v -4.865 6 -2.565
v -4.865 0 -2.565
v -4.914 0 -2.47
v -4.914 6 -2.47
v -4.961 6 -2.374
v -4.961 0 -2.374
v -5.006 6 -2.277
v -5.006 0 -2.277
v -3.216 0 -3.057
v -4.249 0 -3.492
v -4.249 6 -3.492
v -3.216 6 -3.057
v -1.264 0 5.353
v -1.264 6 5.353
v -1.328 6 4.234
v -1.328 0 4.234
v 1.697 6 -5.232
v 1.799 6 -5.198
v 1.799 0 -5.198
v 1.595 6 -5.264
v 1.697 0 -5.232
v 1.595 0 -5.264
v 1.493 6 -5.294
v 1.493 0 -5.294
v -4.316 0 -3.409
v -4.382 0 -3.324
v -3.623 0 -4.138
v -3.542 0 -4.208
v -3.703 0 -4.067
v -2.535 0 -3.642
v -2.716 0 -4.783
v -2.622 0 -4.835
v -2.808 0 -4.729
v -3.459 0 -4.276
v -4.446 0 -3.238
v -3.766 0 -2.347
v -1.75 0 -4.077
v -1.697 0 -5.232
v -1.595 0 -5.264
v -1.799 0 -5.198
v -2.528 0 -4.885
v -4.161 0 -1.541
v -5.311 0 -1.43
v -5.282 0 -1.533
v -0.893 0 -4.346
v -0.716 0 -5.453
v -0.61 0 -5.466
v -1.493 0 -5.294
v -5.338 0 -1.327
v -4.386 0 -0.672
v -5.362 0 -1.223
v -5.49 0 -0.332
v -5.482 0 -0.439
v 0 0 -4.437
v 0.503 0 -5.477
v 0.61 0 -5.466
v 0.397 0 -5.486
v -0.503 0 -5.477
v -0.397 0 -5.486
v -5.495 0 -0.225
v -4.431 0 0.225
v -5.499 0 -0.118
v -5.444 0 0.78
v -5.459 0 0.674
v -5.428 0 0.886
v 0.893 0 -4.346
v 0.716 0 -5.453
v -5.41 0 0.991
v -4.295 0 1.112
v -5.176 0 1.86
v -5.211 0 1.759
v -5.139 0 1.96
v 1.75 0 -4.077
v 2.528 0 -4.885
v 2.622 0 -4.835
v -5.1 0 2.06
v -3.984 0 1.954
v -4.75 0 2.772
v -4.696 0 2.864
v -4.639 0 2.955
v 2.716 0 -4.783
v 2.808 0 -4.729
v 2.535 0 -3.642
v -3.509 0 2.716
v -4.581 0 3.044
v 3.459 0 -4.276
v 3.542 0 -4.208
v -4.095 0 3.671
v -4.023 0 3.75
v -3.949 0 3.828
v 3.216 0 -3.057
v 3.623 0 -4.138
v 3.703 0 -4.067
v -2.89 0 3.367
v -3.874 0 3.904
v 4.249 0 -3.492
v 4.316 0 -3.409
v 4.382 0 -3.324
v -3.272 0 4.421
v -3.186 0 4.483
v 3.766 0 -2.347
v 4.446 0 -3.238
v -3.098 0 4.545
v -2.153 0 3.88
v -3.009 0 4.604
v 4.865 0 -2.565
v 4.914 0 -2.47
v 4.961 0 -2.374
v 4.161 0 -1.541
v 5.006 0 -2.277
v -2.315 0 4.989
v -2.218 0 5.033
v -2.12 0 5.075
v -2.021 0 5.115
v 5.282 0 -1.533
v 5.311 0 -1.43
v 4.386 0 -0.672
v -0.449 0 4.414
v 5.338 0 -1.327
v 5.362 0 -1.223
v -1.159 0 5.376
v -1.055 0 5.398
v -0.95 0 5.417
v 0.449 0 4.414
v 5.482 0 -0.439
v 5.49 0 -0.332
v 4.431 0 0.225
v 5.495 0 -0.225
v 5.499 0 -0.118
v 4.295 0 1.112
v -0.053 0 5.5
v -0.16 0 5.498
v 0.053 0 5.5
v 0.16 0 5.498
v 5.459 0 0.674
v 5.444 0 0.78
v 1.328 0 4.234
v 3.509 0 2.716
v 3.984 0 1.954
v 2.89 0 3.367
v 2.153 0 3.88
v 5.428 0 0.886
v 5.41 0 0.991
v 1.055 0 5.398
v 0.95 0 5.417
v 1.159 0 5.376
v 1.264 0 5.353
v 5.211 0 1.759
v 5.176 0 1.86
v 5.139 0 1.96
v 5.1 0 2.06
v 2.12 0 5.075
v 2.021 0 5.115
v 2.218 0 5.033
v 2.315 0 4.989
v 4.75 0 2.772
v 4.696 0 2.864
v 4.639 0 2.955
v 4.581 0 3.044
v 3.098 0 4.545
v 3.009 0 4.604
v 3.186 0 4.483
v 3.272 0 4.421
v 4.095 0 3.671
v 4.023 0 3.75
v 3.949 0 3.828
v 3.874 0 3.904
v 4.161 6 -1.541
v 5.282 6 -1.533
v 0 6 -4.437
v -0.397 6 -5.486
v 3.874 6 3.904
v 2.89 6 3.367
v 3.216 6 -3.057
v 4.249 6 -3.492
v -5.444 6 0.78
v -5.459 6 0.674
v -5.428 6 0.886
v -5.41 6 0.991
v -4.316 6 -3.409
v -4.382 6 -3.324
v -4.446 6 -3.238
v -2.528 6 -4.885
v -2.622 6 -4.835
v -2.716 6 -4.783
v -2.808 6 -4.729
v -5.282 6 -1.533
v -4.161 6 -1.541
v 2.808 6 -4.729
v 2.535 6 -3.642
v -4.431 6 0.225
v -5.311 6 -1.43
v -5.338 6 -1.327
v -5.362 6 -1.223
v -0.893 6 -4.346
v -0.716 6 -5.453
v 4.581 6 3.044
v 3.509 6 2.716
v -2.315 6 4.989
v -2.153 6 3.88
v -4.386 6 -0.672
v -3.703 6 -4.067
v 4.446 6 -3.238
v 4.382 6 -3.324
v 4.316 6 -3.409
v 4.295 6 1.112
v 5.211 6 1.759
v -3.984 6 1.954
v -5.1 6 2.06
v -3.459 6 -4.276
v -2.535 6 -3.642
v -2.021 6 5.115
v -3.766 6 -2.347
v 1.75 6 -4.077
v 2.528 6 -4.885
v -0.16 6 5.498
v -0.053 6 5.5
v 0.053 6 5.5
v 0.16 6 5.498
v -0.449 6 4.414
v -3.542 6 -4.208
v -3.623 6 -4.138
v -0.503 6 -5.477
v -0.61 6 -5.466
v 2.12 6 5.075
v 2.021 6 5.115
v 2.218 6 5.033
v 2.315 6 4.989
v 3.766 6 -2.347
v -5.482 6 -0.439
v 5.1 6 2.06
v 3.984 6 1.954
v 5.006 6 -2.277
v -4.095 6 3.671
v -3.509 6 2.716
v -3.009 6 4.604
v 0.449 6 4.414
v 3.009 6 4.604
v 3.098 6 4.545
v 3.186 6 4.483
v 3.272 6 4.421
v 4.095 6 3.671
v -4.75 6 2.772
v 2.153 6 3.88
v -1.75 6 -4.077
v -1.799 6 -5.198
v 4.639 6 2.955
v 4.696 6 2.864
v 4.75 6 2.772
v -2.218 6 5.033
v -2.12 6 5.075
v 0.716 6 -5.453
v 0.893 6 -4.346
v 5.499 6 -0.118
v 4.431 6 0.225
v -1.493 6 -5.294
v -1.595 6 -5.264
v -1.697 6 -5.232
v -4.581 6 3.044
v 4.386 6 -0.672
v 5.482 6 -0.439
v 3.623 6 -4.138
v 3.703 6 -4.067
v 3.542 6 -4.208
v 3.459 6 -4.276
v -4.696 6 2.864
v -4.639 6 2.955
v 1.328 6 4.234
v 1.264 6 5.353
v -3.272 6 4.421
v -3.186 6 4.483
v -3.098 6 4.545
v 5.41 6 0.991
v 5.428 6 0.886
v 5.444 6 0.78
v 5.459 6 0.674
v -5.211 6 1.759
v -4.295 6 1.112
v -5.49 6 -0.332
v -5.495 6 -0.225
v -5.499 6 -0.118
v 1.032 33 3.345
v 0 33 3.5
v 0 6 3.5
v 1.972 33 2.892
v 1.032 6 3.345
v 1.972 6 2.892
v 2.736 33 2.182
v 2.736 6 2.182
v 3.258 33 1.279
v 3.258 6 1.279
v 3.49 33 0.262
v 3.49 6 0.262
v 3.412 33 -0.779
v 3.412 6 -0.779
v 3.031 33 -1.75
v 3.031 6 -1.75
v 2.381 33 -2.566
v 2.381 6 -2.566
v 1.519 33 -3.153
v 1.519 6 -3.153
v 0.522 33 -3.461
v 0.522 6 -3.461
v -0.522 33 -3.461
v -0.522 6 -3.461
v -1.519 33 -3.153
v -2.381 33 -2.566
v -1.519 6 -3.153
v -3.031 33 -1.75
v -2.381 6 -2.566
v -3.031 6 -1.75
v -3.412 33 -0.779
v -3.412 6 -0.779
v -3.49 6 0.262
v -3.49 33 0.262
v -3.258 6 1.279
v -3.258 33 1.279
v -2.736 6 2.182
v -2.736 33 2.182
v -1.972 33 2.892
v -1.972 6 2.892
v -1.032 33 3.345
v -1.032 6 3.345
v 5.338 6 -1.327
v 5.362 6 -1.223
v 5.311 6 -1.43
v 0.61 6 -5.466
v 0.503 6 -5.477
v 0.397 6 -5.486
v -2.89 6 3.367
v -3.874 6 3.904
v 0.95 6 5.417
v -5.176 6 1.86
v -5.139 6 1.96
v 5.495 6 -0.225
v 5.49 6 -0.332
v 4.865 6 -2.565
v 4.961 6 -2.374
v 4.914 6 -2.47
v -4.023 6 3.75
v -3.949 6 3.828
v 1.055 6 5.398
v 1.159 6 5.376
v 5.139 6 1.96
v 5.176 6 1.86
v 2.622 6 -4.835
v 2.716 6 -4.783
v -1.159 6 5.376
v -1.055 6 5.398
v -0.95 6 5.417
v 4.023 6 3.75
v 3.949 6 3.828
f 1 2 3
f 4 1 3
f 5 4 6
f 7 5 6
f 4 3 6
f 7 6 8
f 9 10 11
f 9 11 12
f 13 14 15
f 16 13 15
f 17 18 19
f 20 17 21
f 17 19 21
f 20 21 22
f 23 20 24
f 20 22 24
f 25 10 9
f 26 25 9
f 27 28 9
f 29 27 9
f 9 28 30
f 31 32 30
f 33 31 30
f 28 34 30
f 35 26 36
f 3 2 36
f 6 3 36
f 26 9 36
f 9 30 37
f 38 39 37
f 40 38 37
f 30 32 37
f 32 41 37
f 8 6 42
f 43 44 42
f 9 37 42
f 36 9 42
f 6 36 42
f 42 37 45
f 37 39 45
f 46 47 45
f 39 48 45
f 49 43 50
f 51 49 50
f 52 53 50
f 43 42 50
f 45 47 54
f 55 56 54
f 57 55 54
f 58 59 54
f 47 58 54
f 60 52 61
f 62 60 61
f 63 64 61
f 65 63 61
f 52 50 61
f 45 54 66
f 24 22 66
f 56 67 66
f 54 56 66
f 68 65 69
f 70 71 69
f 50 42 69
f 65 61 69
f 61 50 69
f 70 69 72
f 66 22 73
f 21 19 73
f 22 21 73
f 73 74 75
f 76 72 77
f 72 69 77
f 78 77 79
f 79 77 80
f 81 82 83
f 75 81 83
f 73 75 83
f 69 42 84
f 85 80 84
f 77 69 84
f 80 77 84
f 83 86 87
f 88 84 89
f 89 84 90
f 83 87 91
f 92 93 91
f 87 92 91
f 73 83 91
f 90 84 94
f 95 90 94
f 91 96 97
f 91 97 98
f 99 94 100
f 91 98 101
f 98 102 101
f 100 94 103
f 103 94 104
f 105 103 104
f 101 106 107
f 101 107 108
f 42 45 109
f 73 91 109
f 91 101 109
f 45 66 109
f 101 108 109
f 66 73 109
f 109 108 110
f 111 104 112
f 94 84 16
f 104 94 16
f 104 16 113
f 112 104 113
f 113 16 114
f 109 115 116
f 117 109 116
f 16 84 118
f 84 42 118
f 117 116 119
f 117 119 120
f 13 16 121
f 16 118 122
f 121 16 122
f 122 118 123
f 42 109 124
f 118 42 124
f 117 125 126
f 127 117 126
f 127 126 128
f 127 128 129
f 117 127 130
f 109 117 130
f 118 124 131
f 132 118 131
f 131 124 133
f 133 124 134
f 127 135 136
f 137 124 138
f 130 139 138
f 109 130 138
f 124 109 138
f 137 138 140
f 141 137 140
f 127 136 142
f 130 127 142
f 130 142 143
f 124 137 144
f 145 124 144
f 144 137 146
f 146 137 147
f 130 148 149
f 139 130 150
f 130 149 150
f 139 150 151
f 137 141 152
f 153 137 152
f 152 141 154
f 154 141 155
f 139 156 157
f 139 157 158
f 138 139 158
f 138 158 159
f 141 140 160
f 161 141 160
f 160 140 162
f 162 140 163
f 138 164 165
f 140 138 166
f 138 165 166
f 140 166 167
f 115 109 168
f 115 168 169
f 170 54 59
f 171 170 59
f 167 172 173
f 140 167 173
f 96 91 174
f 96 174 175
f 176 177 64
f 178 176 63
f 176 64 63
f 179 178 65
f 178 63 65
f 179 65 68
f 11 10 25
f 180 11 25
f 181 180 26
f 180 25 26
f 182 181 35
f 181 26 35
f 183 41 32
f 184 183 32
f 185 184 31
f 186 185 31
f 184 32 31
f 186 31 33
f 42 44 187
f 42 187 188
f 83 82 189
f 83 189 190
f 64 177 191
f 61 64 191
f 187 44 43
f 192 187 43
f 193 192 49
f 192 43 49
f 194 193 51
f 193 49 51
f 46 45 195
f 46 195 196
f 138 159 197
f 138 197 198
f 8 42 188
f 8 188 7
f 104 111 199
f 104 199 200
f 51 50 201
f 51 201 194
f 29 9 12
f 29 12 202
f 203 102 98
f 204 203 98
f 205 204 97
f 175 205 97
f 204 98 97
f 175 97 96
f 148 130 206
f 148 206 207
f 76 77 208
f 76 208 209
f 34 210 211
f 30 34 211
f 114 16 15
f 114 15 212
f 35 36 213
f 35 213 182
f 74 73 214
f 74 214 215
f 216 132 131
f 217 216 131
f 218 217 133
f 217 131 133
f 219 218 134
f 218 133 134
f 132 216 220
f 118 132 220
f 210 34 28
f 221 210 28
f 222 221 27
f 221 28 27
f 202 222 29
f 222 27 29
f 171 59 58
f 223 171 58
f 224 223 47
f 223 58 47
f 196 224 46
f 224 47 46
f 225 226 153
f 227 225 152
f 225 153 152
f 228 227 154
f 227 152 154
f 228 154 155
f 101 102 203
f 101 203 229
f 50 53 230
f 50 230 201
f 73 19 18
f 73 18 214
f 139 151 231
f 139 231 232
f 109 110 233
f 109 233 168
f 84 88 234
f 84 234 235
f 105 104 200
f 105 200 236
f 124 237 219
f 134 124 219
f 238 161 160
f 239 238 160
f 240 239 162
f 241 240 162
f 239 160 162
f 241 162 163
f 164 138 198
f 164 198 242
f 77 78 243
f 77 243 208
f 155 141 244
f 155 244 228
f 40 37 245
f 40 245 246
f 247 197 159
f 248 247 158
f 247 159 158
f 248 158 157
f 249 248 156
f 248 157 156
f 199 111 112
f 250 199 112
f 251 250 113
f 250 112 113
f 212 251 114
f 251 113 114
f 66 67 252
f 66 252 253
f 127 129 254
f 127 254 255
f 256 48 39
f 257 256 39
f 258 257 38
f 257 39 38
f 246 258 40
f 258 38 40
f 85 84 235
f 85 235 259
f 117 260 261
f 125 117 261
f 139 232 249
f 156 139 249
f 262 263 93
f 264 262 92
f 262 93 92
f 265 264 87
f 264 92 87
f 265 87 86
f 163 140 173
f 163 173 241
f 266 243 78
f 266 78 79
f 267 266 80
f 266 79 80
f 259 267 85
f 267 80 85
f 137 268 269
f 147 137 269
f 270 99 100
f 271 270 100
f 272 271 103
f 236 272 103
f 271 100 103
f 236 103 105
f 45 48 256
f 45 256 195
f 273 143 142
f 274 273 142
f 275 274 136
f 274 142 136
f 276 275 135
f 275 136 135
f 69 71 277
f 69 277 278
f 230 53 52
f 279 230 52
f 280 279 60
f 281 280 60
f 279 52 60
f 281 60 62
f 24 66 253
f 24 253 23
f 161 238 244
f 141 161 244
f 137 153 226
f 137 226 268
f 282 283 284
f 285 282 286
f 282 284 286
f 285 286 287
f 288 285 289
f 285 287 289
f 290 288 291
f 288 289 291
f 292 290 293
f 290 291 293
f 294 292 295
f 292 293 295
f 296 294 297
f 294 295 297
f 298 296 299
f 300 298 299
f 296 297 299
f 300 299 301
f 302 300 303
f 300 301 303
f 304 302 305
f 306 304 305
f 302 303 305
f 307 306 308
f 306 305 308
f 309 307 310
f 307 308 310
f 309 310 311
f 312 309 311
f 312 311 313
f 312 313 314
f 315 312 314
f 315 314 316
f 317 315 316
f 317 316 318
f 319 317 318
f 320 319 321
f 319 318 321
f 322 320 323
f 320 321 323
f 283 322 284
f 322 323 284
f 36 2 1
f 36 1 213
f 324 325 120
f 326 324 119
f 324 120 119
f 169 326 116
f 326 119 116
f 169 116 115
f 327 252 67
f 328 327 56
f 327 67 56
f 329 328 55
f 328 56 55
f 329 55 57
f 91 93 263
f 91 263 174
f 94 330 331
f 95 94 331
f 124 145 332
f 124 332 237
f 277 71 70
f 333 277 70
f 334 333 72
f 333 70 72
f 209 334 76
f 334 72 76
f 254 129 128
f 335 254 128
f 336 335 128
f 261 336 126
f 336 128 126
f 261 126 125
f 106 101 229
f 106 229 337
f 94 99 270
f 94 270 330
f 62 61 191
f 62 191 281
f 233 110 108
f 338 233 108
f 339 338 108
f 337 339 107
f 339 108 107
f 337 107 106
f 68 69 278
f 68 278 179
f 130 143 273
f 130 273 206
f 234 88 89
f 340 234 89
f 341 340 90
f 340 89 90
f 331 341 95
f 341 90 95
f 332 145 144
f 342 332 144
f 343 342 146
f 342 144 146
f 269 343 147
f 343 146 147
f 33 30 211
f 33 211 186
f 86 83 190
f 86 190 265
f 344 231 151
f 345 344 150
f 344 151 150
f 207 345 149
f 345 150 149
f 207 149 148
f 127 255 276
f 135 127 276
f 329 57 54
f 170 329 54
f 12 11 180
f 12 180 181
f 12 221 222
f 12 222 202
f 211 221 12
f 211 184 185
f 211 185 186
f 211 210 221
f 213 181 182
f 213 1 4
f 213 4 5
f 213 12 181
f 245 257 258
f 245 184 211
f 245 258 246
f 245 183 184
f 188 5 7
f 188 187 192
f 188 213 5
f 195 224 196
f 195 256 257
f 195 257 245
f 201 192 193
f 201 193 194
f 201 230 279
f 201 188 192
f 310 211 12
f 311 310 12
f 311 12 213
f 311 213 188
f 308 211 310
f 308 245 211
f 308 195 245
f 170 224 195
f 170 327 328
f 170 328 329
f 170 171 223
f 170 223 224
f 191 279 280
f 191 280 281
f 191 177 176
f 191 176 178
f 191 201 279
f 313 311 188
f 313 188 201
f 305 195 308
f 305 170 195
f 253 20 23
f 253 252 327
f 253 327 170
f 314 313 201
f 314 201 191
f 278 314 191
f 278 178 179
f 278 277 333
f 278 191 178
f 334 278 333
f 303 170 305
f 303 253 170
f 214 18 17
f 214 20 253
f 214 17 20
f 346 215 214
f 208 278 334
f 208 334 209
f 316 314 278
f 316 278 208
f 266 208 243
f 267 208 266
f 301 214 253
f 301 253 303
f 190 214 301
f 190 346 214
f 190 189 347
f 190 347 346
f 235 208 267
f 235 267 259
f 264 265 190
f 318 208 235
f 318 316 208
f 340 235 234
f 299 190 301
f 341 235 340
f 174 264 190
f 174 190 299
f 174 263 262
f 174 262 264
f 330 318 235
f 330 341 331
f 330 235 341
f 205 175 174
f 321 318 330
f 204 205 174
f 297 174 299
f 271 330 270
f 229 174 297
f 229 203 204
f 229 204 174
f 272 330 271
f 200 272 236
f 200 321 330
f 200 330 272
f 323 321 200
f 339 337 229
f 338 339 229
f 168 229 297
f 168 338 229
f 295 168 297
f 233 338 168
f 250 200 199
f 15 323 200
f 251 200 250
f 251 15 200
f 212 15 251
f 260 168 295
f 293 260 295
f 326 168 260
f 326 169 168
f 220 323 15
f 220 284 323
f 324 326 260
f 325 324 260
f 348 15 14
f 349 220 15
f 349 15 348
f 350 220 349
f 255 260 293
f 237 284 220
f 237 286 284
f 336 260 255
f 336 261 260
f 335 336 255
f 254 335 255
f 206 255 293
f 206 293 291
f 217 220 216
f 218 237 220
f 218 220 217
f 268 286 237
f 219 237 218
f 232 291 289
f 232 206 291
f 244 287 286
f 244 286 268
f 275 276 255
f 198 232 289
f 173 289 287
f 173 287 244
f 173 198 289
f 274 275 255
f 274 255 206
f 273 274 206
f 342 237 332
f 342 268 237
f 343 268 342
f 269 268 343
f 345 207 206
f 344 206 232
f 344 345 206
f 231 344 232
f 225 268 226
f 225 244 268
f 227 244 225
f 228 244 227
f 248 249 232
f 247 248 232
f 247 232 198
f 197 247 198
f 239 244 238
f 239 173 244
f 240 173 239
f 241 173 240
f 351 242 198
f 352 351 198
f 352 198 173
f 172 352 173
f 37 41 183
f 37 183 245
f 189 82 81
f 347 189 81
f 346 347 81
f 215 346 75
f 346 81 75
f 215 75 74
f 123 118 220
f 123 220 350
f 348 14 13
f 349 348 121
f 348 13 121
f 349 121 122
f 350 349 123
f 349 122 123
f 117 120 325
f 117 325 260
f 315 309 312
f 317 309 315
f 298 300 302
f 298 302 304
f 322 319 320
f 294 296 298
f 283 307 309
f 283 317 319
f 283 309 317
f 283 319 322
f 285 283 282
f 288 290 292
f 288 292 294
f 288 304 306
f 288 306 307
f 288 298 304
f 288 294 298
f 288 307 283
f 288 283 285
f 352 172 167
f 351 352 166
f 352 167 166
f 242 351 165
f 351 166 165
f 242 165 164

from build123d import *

# Parameters (mm, degrees)
SKETCH_1_R          = 5.5
EXTRUDE_1_DEPTH     = 6
CUT_EXTRUDE_4_DEPTH = 10.823441352
SKETCH_3_R          = 3.5
EXTRUDE_5_DEPTH     = 27


with BuildPart() as part:
    # Эскиз1 → Вытянуть1 (new body)
    with BuildSketch(Plane(origin=(0, 0, 0), x_dir=(1, 0, 0), z_dir=(0, 1, 0))):
        with Locations(Location((0, 0, 0), (0, 0, 270))):
            Circle(SKETCH_1_R)
    extrude(amount=EXTRUDE_1_DEPTH)

    # Эскиз2 → Вытянуть4 (cut, through all)
    with BuildSketch(Plane(origin=(0, 0, 0), x_dir=(1, 0, 0), z_dir=(0, 1, 0))):
        Polygon((-0.5, 5.758821463), (0.5, 5.758821463), (0, 4.437090717), align=None)
        Polygon((0.669477267, 5.741587309), (0.893179795, 4.346263209), (1.649007209, 5.540288789), align=None)
        Polygon((1.811546057, 5.489291897), (1.749792704, 4.077499175), (2.730503868, 5.094936042), align=None)
        Polygon((2.879449938, 5.012264229), (2.534768894, 3.641801846), (3.700213379, 4.440996014), align=None)
        Polygon((3.8294688, 4.330033874), (3.215971348, 3.057008721), (4.518435719, 3.605241087), align=None)
        Polygon((4.622708759, 3.470531425), (3.765511557, 2.3470613), (5.15167277, 2.621887167), align=None)
        Polygon((5.226694479, 2.46894501), (4.16089128, 1.541024913), (5.573999732, 1.531192878), align=None)
        Polygon((5.616698713, 1.366279697), (4.385923626, 0.671898786), (5.76812649, 0.377811373), align=None)
        Polygon((5.776754641, 0.207678733), (4.431395743, -0.224734957), (5.726105473, -0.791037774), align=None)
        Polygon((5.700309556, -0.959424623), (4.295445997, -1.112168024), (5.449657024, -1.927501742), align=None)
        Polygon((5.390493128, -2.087249022), (3.983640188, -1.954068802), (4.950098976, -2.985053562), align=None)
        Polygon((4.859989278, -3.129621201), (3.508743681, -2.715969773), (4.247883295, -3.920396938), align=None)
        Polygon((4.130516895, -4.043866321), (2.890198796, -3.366678623), (3.371758773, -4.695238804), align=None)
        Polygon((3.231940666, -4.792555078), (2.153328833, -3.879555254), (2.35759405, -5.27785704), align=None)
        Polygon((2.201048406, -5.345036067), (1.328301334, -4.233602437), (1.24690915, -5.64439919), align=None)
        Polygon((1.080044966, -5.678690651), (0.448893022, -4.414325439), (0.085175642, -5.779858973), align=None)
        Polygon((-0.085175642, -5.779858973), (-0.448893022, -4.414325439), (-1.080044966, -5.678690651), align=None)
        Polygon((-1.24690915, -5.64439919), (-1.328301334, -4.233602437), (-2.201048406, -5.345036067), align=None)
        Polygon((-2.35759405, -5.27785704), (-2.153328833, -3.879555254), (-3.231940666, -4.792555078), align=None)
        Polygon((-3.371758773, -4.695238804), (-2.890198796, -3.366678623), (-4.130516895, -4.043866321), align=None)
        Polygon((-4.247883295, -3.920396938), (-3.508743681, -2.715969773), (-4.859989278, -3.129621201), align=None)
        Polygon((-4.950098976, -2.985053562), (-3.983640188, -1.954068802), (-5.390493128, -2.087249022), align=None)
        Polygon((-5.449657024, -1.927501742), (-4.295445997, -1.112168024), (-5.700309556, -0.959424623), align=None)
        Polygon((-5.726105473, -0.791037774), (-4.431395743, -0.224734957), (-5.776754641, 0.207678733), align=None)
        Polygon((-5.76812649, 0.377811373), (-4.385923626, 0.671898786), (-5.616698713, 1.366279697), align=None)
        Polygon((-5.573999732, 1.531192878), (-4.16089128, 1.541024913), (-5.226694479, 2.46894501), align=None)
        Polygon((-5.15167277, 2.621887167), (-3.765511557, 2.3470613), (-4.622708759, 3.470531425), align=None)
        Polygon((-4.518435719, 3.605241087), (-3.215971348, 3.057008721), (-3.8294688, 4.330033874), align=None)
        Polygon((-3.700213379, 4.440996014), (-2.534768894, 3.641801846), (-2.879449938, 5.012264229), align=None)
        Polygon((-2.730503868, 5.094936042), (-1.749792704, 4.077499175), (-1.811546057, 5.489291897), align=None)
        Polygon((-1.649007209, 5.540288789), (-0.893179795, 4.346263209), (-0.669477267, 5.741587309), align=None)
    extrude(amount=CUT_EXTRUDE_4_DEPTH, mode=Mode.SUBTRACT)

    # Эскиз3 → Вытянуть5 (add)
    with BuildSketch(Plane(origin=(0, 6, 0), x_dir=(-1, 0, 0), z_dir=(0, 1, 0))):
        with Locations(Location((0, 0, 0), (0, 0, 90))):
            Circle(SKETCH_3_R)
    extrude(amount=EXTRUDE_5_DEPTH)


solid = part.part
